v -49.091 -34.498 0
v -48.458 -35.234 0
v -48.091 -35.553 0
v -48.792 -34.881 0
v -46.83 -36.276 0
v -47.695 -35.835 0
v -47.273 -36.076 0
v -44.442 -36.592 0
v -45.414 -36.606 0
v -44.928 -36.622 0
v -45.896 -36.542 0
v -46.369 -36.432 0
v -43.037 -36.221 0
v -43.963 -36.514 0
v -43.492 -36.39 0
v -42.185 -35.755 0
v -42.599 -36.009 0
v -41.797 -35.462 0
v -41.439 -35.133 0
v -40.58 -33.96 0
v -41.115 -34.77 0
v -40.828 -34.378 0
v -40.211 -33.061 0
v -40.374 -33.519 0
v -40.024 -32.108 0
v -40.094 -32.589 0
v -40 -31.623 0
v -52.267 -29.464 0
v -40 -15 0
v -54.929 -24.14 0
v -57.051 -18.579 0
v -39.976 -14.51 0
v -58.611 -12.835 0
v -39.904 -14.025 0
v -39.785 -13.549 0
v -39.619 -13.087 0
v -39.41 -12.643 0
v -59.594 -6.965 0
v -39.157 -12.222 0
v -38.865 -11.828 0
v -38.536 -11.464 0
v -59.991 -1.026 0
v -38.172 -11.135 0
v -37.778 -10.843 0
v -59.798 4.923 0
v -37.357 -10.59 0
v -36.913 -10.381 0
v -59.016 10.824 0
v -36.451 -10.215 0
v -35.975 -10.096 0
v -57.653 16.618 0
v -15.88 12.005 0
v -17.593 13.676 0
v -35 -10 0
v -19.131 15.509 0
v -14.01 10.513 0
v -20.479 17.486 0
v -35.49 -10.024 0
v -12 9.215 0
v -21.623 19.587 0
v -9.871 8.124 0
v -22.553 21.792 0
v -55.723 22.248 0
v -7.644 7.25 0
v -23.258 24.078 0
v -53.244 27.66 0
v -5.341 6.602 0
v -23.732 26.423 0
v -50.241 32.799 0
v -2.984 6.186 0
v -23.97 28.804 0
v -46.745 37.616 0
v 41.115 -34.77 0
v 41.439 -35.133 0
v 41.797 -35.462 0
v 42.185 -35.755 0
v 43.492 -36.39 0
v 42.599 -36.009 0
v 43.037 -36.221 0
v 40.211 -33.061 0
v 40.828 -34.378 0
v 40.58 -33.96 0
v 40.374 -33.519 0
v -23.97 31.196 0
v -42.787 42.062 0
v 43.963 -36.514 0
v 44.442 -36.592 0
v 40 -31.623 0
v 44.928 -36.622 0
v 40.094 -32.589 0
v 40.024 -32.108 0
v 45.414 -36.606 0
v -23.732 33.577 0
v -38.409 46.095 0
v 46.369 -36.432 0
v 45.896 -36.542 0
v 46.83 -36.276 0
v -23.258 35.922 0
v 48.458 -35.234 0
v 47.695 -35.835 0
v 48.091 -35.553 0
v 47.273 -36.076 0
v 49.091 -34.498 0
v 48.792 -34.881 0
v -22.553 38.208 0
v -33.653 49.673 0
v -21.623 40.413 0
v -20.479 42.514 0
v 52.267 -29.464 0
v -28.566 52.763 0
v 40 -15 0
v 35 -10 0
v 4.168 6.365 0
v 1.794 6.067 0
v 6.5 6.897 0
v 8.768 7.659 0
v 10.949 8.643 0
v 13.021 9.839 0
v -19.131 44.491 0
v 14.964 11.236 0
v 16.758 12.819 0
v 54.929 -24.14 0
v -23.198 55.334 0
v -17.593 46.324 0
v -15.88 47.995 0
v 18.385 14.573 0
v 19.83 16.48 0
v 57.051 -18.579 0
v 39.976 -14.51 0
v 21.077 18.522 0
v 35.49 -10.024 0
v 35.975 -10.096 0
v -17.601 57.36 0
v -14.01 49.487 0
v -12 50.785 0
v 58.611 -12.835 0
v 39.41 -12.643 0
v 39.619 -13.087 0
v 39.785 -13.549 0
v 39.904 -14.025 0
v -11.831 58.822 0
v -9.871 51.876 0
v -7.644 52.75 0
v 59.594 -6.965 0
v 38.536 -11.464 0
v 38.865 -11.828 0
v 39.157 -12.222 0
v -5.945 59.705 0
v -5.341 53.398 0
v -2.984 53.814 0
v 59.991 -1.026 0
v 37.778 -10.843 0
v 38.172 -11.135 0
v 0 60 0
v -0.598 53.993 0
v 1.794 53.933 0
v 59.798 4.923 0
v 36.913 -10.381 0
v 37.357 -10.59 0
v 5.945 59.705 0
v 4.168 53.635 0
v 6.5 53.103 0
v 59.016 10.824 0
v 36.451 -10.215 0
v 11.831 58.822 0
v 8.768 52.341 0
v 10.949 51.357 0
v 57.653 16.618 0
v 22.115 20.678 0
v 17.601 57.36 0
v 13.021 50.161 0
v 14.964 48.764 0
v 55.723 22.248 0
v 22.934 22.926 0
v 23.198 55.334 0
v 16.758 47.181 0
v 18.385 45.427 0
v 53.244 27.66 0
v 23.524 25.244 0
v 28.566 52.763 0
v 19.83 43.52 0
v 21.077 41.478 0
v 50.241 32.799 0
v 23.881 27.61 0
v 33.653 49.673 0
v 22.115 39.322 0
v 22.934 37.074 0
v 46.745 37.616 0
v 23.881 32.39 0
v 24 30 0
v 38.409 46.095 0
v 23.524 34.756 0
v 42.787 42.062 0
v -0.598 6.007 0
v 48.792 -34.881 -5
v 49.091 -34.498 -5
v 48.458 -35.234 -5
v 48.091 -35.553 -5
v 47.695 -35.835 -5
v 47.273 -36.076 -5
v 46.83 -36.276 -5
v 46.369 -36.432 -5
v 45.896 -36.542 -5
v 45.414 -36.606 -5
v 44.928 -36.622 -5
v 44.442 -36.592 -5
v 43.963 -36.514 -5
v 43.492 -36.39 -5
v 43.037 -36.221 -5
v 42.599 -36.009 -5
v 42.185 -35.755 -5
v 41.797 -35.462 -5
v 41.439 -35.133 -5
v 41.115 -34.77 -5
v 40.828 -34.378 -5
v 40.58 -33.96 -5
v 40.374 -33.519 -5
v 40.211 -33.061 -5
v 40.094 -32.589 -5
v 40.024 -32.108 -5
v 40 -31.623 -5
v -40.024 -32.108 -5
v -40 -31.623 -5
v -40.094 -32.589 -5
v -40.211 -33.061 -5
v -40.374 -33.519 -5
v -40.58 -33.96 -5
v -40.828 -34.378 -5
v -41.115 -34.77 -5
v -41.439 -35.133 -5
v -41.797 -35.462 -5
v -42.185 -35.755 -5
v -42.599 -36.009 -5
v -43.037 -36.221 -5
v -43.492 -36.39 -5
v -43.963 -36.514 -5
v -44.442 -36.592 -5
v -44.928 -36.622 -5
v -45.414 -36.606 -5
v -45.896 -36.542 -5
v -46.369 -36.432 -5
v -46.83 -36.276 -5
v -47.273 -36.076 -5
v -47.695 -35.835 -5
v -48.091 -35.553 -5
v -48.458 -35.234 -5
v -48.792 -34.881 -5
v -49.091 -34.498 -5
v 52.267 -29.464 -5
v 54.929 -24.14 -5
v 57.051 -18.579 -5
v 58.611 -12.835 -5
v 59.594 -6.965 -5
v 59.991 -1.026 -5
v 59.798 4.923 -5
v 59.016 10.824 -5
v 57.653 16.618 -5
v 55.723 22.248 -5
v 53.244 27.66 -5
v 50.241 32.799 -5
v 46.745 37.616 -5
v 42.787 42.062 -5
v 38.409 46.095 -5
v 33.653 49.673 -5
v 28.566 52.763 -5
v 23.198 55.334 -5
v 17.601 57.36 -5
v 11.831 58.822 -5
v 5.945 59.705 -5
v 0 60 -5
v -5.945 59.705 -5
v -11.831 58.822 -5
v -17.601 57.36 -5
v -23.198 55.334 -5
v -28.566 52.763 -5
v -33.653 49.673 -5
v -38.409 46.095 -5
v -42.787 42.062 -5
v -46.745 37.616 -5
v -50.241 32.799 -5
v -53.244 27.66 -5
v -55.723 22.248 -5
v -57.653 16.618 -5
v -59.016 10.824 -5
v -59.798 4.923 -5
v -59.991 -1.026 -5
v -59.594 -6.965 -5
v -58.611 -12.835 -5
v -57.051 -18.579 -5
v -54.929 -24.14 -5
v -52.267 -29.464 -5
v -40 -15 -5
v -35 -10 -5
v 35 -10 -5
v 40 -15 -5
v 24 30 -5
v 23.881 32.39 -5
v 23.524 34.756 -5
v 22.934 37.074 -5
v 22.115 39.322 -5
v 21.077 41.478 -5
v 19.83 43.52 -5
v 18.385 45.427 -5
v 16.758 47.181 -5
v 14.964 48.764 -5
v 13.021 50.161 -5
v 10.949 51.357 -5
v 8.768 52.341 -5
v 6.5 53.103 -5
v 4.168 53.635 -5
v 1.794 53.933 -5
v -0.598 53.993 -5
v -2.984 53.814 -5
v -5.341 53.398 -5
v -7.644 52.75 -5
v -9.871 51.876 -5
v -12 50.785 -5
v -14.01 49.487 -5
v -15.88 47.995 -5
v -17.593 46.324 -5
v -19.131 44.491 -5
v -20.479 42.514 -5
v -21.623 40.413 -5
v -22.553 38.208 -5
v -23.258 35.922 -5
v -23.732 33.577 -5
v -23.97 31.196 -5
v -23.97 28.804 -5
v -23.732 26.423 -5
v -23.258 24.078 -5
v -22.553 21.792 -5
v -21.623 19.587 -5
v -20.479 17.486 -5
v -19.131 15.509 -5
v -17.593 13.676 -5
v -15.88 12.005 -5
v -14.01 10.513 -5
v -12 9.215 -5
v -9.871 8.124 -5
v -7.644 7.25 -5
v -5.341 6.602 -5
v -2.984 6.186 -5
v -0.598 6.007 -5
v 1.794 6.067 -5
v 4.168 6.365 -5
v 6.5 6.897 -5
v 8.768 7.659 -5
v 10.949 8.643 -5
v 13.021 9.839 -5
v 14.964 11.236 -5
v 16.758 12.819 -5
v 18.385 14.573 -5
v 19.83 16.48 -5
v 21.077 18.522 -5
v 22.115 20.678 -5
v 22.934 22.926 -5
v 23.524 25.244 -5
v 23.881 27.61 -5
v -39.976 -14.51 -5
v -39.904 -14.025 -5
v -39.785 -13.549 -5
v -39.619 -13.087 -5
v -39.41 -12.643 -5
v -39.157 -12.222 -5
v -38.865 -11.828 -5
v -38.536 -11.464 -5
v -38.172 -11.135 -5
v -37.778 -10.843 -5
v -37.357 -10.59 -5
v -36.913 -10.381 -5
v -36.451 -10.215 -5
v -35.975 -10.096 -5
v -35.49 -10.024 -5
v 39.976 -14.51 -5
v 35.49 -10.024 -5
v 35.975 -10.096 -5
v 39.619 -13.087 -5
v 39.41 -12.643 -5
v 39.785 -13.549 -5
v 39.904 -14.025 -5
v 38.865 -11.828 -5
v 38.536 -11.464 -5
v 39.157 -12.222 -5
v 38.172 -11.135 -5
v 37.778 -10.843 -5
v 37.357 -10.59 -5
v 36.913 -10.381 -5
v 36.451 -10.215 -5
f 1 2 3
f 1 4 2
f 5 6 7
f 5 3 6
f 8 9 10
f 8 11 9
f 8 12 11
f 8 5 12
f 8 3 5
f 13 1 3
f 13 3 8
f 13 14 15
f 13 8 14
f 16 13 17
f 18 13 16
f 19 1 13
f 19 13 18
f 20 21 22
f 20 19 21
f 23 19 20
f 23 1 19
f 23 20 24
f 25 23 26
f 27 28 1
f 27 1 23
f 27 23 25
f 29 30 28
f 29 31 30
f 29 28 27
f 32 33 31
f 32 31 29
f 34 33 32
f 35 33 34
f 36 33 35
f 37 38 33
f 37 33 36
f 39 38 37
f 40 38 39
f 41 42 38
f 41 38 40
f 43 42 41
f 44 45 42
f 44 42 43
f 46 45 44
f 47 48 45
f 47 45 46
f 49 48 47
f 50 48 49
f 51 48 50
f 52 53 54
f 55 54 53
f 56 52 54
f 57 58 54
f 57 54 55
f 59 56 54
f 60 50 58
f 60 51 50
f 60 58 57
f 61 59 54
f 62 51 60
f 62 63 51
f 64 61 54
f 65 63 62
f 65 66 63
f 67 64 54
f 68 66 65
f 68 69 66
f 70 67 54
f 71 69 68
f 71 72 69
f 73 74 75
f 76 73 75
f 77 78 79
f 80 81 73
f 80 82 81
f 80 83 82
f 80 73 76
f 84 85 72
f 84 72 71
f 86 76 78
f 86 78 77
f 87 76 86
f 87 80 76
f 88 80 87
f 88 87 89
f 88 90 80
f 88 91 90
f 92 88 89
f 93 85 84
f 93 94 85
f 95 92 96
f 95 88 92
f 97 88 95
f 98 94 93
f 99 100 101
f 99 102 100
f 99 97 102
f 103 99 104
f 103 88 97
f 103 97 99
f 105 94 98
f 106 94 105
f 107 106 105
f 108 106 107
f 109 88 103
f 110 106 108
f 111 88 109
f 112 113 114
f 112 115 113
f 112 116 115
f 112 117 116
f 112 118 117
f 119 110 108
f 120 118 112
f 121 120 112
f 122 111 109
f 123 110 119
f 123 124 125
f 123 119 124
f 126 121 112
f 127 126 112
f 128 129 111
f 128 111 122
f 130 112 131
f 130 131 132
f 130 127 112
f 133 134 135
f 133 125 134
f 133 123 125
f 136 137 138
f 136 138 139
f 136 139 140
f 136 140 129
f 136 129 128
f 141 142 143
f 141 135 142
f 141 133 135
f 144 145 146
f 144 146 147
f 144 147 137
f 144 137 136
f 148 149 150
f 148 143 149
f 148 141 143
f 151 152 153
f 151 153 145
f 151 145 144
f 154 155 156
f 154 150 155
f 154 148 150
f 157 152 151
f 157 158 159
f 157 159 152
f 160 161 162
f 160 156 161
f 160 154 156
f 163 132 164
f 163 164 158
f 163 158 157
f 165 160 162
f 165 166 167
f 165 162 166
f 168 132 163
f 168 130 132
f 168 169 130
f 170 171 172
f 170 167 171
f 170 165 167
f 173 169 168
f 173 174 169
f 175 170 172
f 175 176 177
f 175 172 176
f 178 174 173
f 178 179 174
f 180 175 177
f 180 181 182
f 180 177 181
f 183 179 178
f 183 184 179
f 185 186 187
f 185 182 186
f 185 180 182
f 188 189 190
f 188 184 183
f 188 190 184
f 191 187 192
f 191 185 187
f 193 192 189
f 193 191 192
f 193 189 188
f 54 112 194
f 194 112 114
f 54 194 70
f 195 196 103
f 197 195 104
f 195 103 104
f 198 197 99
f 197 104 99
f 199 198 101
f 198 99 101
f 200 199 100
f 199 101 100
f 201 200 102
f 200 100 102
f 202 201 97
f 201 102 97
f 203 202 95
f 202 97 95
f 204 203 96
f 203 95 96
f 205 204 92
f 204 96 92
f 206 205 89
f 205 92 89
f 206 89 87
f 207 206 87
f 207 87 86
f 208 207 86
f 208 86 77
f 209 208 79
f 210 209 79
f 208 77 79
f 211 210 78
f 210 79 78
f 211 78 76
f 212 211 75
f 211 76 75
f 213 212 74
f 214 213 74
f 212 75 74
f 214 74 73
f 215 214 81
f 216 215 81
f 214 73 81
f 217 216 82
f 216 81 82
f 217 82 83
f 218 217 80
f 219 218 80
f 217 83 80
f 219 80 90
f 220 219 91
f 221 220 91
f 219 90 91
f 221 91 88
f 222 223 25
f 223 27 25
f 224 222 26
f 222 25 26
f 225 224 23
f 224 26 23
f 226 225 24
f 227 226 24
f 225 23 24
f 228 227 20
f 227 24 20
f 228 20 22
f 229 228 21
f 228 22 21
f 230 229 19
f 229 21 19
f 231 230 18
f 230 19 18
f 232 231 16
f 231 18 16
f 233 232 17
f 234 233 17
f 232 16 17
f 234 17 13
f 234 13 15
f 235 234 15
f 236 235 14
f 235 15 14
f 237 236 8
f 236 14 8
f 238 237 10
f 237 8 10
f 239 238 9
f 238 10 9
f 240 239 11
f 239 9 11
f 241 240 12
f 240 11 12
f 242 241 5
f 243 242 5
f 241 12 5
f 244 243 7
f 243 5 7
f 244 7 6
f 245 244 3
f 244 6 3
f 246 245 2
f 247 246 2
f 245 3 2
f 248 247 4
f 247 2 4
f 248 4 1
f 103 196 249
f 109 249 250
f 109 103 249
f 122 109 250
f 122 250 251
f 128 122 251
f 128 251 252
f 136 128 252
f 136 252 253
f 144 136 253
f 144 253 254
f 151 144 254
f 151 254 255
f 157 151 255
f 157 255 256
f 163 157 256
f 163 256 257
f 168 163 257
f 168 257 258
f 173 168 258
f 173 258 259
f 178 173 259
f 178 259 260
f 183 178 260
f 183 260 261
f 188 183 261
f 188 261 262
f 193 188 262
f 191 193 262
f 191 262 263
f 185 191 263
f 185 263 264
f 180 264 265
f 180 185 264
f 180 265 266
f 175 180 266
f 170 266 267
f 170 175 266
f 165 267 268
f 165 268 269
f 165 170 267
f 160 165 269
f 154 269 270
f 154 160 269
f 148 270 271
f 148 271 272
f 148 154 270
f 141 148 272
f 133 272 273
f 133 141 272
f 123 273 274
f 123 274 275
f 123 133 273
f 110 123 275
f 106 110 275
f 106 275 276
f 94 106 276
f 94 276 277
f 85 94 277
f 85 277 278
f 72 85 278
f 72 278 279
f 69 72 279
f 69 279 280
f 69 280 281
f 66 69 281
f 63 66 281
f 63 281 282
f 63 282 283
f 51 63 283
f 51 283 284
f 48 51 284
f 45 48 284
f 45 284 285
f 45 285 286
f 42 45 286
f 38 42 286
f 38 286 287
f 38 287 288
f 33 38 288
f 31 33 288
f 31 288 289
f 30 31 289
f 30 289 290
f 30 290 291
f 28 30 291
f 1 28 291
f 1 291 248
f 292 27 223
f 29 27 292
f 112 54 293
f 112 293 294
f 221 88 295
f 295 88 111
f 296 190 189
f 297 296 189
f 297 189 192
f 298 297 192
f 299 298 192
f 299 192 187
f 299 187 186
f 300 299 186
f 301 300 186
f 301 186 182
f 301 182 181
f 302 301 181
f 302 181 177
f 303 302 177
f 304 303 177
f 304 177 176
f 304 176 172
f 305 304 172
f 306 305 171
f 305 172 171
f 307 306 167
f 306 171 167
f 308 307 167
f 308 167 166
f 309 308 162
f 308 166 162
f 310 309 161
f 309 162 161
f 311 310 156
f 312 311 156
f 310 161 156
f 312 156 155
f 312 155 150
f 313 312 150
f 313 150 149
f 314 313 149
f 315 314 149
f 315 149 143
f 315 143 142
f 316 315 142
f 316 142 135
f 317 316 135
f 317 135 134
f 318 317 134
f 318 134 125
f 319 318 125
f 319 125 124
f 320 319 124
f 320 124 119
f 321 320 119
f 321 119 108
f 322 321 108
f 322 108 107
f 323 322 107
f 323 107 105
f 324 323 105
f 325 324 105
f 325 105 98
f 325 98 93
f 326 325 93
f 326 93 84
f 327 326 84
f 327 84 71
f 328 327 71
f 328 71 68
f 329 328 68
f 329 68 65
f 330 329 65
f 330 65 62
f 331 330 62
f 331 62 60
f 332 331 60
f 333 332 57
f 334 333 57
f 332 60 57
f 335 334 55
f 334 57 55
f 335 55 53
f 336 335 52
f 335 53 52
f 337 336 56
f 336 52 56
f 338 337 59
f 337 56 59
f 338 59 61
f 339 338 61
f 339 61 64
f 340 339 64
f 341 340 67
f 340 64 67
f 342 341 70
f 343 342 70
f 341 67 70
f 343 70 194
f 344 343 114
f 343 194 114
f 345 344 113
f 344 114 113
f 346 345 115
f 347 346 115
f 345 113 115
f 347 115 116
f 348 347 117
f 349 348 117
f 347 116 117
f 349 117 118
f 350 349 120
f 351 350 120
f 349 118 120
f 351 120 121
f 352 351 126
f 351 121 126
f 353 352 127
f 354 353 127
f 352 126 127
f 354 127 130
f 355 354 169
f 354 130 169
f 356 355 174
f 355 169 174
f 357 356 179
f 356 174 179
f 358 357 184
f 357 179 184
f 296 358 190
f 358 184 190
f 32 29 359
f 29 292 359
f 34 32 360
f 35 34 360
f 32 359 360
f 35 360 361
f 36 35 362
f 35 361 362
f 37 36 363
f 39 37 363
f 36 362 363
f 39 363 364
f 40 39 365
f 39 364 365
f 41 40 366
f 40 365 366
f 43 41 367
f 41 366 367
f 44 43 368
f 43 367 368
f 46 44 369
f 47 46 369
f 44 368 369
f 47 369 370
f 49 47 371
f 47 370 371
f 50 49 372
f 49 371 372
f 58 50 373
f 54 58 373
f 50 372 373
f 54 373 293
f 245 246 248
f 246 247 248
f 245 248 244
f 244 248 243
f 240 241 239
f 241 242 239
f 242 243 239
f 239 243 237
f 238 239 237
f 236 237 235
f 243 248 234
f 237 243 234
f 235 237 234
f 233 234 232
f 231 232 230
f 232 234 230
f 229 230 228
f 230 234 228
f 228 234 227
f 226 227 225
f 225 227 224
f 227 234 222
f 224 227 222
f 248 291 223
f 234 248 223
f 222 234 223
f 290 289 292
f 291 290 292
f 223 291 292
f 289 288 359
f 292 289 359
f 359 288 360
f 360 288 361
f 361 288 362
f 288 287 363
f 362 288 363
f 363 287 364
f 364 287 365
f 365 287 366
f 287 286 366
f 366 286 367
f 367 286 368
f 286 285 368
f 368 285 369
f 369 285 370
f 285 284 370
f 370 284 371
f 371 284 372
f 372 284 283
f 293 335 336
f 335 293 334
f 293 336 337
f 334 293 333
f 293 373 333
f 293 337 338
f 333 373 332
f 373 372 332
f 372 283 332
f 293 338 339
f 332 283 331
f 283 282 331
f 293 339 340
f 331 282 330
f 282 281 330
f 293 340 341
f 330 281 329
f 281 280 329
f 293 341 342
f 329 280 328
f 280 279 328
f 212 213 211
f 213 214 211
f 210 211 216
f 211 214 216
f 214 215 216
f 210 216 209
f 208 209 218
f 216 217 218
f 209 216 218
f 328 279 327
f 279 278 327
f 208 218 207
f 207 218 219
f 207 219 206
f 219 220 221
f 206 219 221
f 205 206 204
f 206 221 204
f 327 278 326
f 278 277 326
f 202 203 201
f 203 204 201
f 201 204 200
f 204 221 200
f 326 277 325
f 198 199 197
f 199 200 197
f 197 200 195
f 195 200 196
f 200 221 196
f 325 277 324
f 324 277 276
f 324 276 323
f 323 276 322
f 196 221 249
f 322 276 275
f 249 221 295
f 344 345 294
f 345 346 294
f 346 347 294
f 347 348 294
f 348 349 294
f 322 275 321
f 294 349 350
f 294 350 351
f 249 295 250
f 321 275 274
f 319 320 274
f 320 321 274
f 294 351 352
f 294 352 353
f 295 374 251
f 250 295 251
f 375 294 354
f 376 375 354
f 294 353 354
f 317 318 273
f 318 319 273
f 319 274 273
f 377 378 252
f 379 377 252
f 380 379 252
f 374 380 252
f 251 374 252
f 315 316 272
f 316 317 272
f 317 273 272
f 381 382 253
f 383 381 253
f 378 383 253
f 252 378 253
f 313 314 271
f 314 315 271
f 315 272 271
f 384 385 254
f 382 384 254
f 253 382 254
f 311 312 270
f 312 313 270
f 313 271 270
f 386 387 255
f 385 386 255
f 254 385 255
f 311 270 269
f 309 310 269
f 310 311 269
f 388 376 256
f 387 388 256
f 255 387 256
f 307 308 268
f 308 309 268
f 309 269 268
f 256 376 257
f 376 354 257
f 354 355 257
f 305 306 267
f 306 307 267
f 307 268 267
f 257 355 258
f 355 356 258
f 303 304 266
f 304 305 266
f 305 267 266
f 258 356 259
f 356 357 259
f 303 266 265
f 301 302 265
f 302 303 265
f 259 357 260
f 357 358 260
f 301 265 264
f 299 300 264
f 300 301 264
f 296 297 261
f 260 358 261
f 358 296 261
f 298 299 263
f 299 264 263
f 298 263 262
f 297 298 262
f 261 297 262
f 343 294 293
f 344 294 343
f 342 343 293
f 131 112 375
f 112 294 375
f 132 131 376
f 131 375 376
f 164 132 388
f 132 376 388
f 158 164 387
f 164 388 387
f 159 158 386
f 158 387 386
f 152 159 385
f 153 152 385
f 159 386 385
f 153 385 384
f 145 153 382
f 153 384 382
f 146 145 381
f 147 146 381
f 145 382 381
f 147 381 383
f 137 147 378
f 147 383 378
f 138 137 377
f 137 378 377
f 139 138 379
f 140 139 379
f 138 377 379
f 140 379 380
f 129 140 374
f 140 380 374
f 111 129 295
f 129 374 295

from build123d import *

# Parameters (mm, degrees)
F0_R     = 60
F3_DEPTH = 5
F1_R     = 24
F2_W     = 80
F2_H     = 80
F4_DEPTH = 5.001
F5_R     = 5
F6_R     = 5


with BuildPart() as f3:
    # F0 (on Top) → F3 (new body)
    with BuildSketch(Plane.XY):
        Circle(F0_R)
    extrude(amount=-F3_DEPTH)

    # F1 (on Top) + F2 (on Top) → F4 (cut, through all)
    with BuildSketch(Plane.XY):
        with Locations((0, 30)):
            Circle(F1_R)
    with BuildSketch(Plane.XY):
        with Locations((0, -50)):
            Rectangle(F2_W, F2_H)
    extrude(amount=-F4_DEPTH, mode=Mode.SUBTRACT)

    # F5
    f5_edges = [f3.edges().sort_by_distance(p)[0] for p in [
        (-40, -10, -2.5),
        (40, -10, -2.5),
    ]]
    fillet(f5_edges, radius=F5_R)

    # F6
    f6_edges = [f3.edges().sort_by_distance(p)[0] for p in [
        (-40, -44.72136, -2.5),
        (40, -44.72136, -2.5),
    ]]
    fillet(f6_edges, radius=F6_R)


solid = f3.part
